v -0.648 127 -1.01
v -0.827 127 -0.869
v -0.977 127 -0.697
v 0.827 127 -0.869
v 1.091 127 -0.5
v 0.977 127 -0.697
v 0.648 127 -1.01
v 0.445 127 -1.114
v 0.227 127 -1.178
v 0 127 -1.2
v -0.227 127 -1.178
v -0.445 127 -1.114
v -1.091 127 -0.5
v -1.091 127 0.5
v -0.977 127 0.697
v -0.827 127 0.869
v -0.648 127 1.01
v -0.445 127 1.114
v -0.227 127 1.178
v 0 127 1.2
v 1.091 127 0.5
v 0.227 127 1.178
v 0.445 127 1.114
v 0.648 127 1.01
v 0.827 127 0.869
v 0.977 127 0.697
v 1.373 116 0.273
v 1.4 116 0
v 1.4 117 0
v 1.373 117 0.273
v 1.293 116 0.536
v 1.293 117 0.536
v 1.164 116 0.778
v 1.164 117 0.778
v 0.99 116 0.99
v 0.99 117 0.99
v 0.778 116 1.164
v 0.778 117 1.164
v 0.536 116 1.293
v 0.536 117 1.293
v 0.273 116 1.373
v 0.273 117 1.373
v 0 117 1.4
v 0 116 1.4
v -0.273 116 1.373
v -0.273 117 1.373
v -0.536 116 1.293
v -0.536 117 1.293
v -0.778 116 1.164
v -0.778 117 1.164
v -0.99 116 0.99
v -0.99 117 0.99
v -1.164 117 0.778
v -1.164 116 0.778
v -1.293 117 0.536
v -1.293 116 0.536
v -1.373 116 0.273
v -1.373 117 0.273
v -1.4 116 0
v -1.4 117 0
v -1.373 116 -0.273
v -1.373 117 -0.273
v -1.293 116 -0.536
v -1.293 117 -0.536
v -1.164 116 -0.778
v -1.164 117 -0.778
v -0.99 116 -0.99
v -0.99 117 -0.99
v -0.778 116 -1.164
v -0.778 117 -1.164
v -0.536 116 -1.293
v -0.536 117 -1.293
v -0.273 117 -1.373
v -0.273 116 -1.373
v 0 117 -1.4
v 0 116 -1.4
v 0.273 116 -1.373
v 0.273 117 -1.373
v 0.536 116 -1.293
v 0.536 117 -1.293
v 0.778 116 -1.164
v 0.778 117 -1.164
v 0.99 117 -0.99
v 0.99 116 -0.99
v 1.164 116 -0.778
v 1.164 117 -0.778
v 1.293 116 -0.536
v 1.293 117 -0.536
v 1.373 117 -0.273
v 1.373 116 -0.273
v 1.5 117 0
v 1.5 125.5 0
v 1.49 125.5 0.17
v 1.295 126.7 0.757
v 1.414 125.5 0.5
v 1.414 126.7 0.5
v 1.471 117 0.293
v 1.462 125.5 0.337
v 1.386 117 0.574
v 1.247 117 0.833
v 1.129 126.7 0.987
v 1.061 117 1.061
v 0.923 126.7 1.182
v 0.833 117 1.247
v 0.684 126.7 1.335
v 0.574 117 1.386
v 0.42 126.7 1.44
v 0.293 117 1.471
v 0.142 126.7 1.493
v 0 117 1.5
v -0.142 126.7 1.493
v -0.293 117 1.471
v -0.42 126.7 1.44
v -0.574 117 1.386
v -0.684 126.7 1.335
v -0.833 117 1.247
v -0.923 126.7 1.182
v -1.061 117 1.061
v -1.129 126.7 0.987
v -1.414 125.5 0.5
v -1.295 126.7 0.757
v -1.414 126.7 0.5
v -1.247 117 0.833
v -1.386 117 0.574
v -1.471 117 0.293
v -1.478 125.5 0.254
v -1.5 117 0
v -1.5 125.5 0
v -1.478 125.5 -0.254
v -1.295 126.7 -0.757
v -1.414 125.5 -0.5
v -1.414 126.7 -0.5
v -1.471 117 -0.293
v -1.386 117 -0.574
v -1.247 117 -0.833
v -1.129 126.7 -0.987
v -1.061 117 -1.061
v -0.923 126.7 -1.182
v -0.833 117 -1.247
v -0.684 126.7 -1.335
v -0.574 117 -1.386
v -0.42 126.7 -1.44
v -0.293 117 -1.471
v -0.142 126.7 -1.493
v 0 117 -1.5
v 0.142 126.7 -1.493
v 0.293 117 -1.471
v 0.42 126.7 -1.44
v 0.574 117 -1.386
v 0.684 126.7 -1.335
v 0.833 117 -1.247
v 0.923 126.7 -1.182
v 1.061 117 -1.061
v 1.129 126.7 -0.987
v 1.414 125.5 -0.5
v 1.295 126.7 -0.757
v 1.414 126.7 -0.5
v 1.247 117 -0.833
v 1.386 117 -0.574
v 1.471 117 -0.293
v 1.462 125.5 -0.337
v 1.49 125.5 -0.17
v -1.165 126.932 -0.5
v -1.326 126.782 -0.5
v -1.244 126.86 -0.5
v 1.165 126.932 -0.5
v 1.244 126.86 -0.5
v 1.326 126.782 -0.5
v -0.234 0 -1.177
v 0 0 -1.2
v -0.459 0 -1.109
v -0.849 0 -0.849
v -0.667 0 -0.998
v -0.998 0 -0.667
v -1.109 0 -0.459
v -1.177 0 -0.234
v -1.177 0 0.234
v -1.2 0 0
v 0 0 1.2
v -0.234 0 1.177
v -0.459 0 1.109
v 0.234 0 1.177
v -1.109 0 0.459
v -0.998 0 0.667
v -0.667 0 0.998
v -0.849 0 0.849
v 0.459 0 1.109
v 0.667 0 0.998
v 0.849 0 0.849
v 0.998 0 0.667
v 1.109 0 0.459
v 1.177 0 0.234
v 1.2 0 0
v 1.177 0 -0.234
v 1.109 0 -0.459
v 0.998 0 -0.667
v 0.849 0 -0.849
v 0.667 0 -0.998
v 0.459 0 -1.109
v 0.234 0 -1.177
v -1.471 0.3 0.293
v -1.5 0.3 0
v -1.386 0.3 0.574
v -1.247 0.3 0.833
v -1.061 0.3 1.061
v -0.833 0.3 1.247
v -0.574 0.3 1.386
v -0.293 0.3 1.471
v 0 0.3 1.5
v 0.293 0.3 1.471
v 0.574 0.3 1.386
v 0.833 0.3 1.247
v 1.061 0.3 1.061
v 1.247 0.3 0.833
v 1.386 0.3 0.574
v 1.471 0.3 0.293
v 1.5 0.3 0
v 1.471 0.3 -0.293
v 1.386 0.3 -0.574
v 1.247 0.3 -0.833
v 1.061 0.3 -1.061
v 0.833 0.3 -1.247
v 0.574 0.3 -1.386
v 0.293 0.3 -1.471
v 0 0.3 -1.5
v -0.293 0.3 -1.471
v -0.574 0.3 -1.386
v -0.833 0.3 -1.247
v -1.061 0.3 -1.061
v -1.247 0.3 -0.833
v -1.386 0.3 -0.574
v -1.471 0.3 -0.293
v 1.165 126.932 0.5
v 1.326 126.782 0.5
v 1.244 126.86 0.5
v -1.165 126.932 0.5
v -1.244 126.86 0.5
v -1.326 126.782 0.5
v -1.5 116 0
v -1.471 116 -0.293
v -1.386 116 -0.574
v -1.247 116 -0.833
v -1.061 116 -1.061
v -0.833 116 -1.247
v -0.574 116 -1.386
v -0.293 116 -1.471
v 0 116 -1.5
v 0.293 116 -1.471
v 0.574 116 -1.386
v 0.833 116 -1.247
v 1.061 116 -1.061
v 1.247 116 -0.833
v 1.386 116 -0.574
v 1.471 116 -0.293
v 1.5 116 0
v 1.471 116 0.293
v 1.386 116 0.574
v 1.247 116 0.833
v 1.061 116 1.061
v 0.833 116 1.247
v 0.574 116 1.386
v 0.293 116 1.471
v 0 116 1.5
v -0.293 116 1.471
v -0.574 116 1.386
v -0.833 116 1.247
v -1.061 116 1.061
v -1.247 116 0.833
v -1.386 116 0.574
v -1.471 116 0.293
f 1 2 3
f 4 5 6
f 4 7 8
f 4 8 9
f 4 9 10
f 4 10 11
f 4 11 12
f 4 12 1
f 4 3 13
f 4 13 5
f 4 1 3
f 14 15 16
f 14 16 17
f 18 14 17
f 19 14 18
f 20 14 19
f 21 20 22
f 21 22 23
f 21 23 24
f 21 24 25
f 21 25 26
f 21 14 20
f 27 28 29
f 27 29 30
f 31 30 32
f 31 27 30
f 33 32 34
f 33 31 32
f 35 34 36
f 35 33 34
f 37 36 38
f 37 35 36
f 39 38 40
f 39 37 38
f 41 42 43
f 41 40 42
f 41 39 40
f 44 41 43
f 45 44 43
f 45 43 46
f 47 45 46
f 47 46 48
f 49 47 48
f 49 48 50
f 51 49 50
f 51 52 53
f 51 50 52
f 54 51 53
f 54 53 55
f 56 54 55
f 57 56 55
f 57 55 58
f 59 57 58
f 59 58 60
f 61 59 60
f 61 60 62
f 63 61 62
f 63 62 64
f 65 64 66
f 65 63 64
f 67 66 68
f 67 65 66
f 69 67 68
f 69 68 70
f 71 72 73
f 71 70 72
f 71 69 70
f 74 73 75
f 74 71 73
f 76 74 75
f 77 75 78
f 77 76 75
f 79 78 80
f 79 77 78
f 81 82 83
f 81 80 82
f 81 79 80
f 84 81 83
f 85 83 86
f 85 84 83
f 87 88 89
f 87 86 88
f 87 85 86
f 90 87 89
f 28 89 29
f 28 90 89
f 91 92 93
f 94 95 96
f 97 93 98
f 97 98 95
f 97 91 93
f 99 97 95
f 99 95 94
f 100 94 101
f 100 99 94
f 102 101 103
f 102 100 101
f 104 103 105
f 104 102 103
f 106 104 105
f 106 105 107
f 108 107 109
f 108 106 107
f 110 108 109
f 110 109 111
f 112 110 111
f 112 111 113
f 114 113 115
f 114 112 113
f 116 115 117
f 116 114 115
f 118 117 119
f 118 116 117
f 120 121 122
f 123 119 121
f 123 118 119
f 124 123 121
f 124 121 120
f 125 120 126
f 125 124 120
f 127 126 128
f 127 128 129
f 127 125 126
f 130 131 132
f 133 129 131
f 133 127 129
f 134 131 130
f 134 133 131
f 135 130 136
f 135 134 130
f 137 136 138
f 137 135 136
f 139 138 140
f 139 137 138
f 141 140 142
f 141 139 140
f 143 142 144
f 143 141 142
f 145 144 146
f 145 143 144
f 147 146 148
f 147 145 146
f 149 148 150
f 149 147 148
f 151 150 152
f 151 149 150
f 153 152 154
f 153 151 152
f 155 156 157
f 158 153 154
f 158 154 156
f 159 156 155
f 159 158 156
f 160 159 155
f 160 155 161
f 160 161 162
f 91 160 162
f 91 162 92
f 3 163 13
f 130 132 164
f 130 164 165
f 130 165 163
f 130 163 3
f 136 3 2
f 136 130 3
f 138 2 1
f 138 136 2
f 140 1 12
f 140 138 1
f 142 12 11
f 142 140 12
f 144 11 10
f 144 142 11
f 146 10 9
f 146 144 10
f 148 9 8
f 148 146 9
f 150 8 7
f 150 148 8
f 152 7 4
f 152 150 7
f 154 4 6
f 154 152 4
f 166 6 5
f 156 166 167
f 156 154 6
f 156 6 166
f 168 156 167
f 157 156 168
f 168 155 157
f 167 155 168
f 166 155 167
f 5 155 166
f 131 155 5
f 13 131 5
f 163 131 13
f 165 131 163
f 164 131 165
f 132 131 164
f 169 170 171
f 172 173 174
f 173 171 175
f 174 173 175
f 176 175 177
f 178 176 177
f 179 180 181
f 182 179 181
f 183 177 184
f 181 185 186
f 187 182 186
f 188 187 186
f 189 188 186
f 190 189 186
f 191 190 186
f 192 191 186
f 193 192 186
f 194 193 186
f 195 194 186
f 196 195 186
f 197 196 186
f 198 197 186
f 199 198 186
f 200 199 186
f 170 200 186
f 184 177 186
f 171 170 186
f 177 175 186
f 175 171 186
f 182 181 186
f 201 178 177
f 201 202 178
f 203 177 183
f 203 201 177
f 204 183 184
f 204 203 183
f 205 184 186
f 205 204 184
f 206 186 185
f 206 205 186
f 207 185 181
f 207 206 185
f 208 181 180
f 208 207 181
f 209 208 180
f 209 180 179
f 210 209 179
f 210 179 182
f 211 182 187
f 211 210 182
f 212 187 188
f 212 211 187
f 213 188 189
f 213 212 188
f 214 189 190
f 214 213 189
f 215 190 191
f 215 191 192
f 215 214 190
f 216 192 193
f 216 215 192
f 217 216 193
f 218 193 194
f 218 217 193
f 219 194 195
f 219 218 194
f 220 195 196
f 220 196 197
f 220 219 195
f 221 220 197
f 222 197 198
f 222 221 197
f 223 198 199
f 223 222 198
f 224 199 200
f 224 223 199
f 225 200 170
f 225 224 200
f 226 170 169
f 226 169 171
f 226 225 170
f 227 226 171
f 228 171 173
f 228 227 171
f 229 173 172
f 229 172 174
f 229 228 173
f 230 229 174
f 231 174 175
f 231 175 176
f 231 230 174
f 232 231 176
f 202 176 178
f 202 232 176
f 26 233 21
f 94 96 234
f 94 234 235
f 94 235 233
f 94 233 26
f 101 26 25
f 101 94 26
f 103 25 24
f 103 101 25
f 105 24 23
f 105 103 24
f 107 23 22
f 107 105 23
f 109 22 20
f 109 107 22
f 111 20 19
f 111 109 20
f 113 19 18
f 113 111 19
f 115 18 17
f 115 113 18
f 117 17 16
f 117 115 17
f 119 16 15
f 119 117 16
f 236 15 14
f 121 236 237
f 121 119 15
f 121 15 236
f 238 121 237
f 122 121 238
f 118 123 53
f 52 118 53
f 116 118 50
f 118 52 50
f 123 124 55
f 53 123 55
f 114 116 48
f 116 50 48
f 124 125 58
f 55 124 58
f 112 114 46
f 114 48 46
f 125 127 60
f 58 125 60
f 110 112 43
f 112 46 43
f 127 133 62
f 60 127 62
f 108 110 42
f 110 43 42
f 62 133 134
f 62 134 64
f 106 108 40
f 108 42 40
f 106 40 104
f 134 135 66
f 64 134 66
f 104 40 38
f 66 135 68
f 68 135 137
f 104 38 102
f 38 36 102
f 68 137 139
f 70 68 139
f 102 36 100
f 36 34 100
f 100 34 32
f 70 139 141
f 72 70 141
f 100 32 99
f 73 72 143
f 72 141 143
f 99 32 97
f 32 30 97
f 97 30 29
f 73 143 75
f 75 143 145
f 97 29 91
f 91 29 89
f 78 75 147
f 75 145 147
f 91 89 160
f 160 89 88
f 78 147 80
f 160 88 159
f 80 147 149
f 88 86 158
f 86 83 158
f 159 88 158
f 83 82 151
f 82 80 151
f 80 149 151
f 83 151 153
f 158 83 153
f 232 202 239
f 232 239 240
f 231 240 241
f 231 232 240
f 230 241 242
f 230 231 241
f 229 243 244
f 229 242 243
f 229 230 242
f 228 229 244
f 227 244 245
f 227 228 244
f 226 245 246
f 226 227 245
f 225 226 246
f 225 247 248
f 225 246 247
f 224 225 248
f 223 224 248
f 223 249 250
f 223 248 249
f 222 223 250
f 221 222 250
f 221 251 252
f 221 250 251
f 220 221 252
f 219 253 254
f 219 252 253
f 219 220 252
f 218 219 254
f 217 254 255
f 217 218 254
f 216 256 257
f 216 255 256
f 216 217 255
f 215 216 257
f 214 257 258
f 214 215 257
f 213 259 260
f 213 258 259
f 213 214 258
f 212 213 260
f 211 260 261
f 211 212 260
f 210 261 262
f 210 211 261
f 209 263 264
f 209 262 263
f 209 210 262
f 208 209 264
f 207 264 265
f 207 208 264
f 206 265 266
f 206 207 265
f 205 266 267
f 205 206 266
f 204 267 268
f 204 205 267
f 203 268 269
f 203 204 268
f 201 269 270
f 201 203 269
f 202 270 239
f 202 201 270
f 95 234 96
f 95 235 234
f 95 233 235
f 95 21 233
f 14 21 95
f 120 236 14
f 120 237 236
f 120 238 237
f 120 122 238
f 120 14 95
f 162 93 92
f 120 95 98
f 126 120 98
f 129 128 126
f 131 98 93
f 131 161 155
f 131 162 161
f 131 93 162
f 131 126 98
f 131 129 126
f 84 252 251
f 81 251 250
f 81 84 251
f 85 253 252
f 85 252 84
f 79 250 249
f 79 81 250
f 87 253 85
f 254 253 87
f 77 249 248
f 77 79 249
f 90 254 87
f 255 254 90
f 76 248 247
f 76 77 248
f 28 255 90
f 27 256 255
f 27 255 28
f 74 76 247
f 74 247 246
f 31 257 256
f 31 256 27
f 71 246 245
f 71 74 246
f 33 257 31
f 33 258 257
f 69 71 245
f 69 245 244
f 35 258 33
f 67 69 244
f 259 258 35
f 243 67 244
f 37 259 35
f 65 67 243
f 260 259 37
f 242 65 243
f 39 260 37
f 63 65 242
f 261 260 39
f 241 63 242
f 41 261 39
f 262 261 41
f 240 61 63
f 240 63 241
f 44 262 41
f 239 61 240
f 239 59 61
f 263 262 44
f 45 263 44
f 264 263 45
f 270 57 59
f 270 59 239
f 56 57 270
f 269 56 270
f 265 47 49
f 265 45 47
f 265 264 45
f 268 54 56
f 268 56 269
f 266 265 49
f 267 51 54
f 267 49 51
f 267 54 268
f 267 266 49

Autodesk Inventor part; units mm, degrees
ref_plane "YZ Plane" through (0, 0, 0) normal (1, 0, 0) x (0, 1, 0)
ref_plane "XZ Plane" through (0, 0, 0) normal (0, 1, 0) x (-1, 0, 0)
ref_plane "XY Plane" through (0, 0, 0) normal (0, 0, 1) x (1, 0, 0)
sketch "Sketch1" plane through (0, 0, 0) normal (0, 1, 0) x (-1, 0, 0)
  circle A0 centre (0, 0) radius 1.5
  dimension "d0" = 3
extrude "Extrusion1" add sketch "Sketch1" along normal blind 116
sketch "Sketch2" plane through (0, 116, 0) normal (0, 1, 0) x (1, 0, 0)
  circle A0 centre (0, 0) radius 1.4
  dimension "d3" = 2.8
extrude "Extrusion2" add sketch "Sketch2" along normal blind 1
sketch "Sketch3" plane through (0, 117, 0) normal (0, 1, 0) x (1, 0, 0)
  circle A0 centre (0, 0) radius 1.5
  dimension "d6" = 3
extrude "Extrusion3" add sketch "Sketch3" along normal blind 10
thread "Thread1" size "M3x0.5" class "6g" standard "ANSI Metric M Profile" full length
chamfer "Chamfer1" distance 0.3 angle 45 1 edges at (-1.5, 127, 0)
chamfer "Chamfer2" distance 0.3 angle 45 1 edges at (1.5, 0, 0)
sketch "Sketch4" plane through (0, 0, 0) normal (1, 0, 0) x (0, 1, 0)
  line L0 (117, -1.5) -> (117, 1.5) projected
  line L1 (126.7, -1.5) -> (126.7, 1.5) projected
  line L2 (126.7, -1.5) -> (126.7, 1.5) projected
  line L3 (127, 1.2) -> (127, -1.2) projected
  line L4 (128.5, 0.5) -> (125.5, 0.5)
  line L5 (125.5, 0.5) -> (125.5, -0.5)
  line L6 (125.5, -0.5) -> (128.5, -0.5)
  line L7 (128.5, -0.5) -> (128.5, 0.5)
  line L8 (127, 1.2) -> (127, -1.2) projected
  line L9 (128.5, 0.5) -> (125.5, -0.5) construction
  line L10 (125.5, 0.5) -> (128.5, -0.5) construction
  point P0 (0, 0)
  point P1 (127, 0)
  dimension "d17" = 3
  dimension "d18" = 1
extrude "Extrusion4" cut sketch "Sketch4" along normal mid plane 10
properties part number "wał_prowadzący_hamulca_długi" material "Aluminum 6061"
